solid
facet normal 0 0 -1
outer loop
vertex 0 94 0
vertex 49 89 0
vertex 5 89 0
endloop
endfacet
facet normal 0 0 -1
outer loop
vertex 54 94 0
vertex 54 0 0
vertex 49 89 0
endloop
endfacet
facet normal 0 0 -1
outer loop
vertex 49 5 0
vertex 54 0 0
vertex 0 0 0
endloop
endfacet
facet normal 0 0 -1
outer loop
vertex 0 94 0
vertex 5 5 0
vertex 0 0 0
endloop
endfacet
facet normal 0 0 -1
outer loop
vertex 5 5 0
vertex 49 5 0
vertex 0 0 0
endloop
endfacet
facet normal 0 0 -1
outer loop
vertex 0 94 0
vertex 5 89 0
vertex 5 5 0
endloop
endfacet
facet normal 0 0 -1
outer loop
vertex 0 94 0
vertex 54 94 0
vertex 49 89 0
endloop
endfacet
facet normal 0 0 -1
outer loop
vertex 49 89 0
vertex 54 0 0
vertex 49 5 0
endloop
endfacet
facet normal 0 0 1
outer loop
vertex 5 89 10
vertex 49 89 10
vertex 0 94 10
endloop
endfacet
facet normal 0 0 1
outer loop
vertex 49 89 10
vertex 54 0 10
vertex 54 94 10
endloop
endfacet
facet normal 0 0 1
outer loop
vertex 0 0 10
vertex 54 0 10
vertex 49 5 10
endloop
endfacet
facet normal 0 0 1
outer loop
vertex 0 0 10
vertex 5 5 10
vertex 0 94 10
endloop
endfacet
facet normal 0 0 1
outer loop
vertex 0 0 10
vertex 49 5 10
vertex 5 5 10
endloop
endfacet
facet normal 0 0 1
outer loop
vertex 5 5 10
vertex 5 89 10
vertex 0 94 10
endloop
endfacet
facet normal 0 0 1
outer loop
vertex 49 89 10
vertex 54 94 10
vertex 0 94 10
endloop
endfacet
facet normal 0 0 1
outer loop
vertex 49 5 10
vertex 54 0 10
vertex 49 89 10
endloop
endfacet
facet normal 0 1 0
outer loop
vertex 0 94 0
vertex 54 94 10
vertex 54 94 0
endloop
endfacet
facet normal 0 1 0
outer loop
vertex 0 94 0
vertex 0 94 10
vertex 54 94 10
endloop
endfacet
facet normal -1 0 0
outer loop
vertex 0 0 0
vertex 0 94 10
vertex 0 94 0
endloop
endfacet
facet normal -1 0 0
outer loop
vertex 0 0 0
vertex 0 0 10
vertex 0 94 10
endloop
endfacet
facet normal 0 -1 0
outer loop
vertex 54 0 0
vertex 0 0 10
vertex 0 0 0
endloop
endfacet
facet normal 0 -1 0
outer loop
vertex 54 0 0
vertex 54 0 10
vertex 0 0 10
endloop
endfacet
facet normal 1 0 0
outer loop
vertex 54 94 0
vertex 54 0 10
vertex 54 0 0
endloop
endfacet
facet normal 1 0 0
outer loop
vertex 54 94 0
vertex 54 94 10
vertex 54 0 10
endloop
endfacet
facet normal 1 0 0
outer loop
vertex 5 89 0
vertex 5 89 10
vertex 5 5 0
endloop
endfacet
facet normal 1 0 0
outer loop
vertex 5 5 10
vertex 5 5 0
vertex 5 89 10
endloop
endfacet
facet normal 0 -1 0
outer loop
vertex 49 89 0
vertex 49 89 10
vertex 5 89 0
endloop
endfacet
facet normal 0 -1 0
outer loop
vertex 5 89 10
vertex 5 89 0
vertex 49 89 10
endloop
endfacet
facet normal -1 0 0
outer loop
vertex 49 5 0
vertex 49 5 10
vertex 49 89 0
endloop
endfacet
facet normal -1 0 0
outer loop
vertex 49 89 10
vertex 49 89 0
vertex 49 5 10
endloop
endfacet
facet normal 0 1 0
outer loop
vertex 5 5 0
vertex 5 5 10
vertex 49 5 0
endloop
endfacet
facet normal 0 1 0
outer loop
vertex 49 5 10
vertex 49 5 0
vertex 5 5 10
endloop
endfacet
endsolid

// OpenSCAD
// file: pipe.scad
// Function to create a rectangular frame with Z-height
module rectangular_frame(outer_width, outer_height, frame_width, z_height) {
    // Calculate inner dimensions
    inner_width = outer_width - 2 * frame_width;
    inner_height = outer_height - 2 * frame_width;

    // Extrude the 2D frame into 3D
    linear_extrude(height = z_height) {
        difference() {
            square([outer_width, outer_height]);
            translate([frame_width, frame_width])
                square([inner_width, inner_height]);
        }
    }
}

// Example usage
//rectangular_frame(100, 60, 3, 10); // 100x60mm outer size, 3mm frame width, 5mm Z-height
// main file
use <pipe.scad>; // Use `use` to import only the module


// Example usage
rectangular_frame(54, 94, 5, 10);
